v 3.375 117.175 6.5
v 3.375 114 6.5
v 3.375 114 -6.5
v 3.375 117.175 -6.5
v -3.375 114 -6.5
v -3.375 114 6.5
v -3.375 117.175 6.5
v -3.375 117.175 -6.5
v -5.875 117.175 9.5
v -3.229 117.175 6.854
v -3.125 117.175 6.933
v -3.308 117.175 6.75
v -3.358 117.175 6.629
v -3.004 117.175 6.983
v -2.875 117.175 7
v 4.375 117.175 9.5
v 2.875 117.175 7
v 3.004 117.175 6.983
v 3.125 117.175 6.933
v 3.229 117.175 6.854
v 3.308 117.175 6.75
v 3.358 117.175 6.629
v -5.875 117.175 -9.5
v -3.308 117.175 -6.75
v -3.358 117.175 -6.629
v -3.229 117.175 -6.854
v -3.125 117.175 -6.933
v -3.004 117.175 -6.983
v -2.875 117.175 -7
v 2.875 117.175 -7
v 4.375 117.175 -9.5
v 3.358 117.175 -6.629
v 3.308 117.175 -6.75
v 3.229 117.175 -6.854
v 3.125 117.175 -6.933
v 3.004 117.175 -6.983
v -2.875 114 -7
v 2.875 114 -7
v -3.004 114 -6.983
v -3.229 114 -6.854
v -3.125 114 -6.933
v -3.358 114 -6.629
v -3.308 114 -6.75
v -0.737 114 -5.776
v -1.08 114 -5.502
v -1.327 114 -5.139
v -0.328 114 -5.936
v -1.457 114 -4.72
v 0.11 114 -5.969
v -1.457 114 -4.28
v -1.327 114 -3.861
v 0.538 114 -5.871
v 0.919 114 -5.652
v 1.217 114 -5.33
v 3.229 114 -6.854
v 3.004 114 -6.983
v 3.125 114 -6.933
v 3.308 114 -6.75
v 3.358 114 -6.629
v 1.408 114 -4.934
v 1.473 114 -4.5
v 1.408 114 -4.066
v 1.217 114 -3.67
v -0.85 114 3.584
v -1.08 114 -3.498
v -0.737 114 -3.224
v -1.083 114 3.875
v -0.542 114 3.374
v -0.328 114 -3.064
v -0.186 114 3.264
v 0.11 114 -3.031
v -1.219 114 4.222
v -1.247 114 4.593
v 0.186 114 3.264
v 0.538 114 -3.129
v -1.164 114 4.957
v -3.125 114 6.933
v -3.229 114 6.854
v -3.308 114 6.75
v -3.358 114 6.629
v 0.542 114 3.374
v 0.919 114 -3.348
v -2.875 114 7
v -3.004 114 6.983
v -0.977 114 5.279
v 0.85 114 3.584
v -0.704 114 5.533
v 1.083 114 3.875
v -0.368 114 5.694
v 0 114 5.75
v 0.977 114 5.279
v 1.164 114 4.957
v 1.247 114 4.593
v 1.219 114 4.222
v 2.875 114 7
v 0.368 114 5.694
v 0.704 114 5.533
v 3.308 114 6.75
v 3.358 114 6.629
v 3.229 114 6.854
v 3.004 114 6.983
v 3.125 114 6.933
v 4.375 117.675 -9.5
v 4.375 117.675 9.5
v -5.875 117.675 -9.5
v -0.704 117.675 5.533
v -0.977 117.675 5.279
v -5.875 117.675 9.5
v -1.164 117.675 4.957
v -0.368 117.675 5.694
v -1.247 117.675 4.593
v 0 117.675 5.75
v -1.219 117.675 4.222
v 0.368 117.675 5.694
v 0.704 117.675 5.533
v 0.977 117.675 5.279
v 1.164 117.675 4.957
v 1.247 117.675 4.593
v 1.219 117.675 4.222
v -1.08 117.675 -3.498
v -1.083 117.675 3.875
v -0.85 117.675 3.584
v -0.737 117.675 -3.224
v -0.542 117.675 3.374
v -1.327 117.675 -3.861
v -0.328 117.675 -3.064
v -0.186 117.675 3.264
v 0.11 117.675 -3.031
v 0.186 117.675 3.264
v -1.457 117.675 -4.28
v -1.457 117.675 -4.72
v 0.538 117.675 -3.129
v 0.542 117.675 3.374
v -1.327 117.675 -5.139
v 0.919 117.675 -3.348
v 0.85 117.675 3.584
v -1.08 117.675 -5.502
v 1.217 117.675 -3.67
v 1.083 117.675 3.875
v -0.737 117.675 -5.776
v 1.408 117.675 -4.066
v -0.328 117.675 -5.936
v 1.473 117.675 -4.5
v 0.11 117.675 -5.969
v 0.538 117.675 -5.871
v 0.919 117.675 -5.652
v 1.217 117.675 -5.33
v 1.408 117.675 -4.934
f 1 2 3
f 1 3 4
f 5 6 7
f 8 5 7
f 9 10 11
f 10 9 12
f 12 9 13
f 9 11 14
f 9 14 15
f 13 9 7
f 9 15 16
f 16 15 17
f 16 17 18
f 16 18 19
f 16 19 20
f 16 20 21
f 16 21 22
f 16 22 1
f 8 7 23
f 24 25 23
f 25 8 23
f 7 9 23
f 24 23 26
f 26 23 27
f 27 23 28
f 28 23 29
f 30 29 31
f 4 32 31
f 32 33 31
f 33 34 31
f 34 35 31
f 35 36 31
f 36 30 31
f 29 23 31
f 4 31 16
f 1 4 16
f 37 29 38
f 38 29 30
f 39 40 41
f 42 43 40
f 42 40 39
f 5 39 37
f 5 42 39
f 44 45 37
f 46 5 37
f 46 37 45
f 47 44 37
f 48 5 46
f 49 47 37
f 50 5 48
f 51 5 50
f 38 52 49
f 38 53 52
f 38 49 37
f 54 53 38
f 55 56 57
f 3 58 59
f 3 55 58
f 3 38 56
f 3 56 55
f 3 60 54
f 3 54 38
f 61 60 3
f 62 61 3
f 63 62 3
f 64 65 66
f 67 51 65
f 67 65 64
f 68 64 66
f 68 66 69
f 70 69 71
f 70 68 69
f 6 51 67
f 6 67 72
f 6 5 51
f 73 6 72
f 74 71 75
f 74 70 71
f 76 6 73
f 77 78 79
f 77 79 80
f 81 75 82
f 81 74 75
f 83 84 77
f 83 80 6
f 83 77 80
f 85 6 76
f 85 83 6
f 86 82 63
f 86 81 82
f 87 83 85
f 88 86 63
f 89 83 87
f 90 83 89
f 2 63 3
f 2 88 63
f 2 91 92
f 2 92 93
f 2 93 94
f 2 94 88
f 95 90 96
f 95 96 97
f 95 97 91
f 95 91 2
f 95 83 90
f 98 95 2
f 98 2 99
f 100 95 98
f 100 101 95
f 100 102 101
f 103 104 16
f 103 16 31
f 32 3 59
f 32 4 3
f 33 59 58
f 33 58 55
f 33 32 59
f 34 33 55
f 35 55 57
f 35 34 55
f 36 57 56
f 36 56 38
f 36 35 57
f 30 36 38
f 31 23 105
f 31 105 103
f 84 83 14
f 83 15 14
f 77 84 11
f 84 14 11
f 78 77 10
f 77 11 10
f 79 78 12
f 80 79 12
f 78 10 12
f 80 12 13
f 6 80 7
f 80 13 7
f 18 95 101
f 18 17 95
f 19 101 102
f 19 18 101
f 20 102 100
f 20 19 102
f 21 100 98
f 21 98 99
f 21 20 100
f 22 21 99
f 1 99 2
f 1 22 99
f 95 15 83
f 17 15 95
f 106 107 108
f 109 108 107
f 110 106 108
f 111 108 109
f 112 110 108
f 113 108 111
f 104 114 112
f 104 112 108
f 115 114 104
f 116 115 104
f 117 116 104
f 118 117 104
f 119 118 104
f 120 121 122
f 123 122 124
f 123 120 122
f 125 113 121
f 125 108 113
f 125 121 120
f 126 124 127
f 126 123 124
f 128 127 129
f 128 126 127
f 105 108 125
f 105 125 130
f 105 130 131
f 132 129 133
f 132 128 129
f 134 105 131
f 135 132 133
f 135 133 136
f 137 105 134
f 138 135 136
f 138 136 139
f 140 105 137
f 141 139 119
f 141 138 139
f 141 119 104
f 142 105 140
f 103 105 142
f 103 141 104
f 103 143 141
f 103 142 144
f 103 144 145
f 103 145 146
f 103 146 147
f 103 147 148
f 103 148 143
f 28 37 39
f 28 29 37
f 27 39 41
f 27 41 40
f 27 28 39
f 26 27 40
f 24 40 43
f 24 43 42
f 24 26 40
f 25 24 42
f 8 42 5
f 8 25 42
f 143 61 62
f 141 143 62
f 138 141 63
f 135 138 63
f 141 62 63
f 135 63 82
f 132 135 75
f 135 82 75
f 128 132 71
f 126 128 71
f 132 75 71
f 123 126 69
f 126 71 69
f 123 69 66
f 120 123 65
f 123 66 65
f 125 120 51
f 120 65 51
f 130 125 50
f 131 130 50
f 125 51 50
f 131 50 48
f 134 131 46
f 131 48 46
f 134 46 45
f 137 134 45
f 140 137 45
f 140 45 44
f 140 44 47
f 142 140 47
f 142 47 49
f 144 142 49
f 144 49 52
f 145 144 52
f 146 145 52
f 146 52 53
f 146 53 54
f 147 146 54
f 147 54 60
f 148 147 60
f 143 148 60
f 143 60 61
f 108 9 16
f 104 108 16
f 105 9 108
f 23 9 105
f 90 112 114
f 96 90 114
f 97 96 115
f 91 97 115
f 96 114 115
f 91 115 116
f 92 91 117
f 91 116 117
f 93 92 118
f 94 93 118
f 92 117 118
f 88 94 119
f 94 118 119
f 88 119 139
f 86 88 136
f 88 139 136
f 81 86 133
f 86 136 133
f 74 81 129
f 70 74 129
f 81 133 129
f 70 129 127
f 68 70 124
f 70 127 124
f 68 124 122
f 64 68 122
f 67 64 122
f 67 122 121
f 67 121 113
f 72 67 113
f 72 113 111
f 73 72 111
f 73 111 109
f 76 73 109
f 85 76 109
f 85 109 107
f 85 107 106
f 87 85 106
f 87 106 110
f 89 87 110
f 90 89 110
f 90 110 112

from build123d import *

# Parameters (mm, degrees)
SKETCH1_W             = 6.75
SKETCH1_H             = 3.175
EXTRUDE1_DEPTH        = 7
SKETCH6_W             = 11.75
SKETCH6_H             = 19
EXTRUDE2_DEPTH        = 0.5
F_4_CLEARANCE_HOLE1_D = 2.9464
SKETCH3_R             = 1.25
CUT_EXTRUDE1_DEPTH    = 4.675
FILLET1_R             = 0.5
SKETCH16_W            = 19
SKETCH16_H            = 0.5
CUT_EXTRUDE7_DEPTH    = 1.5


with BuildPart() as part:
    # Sketch1 → Extrude1 (new body, symmetric)
    with BuildSketch(Plane.XY):
        with Locations((0, 115.5875)):
            Rectangle(SKETCH1_W, SKETCH1_H)
    extrude(amount=EXTRUDE1_DEPTH, both=True)

    # Sketch6 → Extrude2 (add)
    with BuildSketch(Plane(origin=(0, 117.175, 0), x_dir=(1, 0, 0), z_dir=(0, 1, 0))):
        Rectangle(SKETCH6_W, SKETCH6_H)
    extrude(amount=EXTRUDE2_DEPTH)

    # 4 Clearance Hole1 (through all)
    with Locations(Plane(origin=(-0.355703292, 117.675, 3.885176073), x_dir=(-1, 0, 0), z_dir=(0, 1, 0))):
        with Locations((-0.355703292, -8.385176073)):
            Hole(F_4_CLEARANCE_HOLE1_D / 2)

    # Sketch3 → Cut-Extrude1 (cut, through all)
    with BuildSketch(Plane(origin=(0, 117.675, 0), x_dir=(1, 0, 0), z_dir=(0, 1, 0))):
        with Locations(Location((0, -4.5, 0), (0, 0, 270))):  # turned: the seam where the file's is
            Circle(SKETCH3_R)
    extrude(amount=-CUT_EXTRUDE1_DEPTH, mode=Mode.SUBTRACT)

    # Fillet1
    fillet1_edges = [part.edges().sort_by_distance(p)[0] for p in [
        (-3.375, 115.5875, 7),
        (-3.375, 115.5875, -7),
        (3.375, 115.5875, -7),
        (3.375, 115.5875, 7),
    ]]
    fillet(fillet1_edges, radius=FILLET1_R)

    # Sketch16 → Cut-Extrude7 (cut)
    with BuildSketch(Plane(origin=(5.875, 0, 0), x_dir=(0, 0, -1), z_dir=(1, 0, 0))):
        with Locations((0, 117.425)):
            Rectangle(SKETCH16_W, SKETCH16_H)
    extrude(amount=-CUT_EXTRUDE7_DEPTH, mode=Mode.SUBTRACT)


solid = part.part
